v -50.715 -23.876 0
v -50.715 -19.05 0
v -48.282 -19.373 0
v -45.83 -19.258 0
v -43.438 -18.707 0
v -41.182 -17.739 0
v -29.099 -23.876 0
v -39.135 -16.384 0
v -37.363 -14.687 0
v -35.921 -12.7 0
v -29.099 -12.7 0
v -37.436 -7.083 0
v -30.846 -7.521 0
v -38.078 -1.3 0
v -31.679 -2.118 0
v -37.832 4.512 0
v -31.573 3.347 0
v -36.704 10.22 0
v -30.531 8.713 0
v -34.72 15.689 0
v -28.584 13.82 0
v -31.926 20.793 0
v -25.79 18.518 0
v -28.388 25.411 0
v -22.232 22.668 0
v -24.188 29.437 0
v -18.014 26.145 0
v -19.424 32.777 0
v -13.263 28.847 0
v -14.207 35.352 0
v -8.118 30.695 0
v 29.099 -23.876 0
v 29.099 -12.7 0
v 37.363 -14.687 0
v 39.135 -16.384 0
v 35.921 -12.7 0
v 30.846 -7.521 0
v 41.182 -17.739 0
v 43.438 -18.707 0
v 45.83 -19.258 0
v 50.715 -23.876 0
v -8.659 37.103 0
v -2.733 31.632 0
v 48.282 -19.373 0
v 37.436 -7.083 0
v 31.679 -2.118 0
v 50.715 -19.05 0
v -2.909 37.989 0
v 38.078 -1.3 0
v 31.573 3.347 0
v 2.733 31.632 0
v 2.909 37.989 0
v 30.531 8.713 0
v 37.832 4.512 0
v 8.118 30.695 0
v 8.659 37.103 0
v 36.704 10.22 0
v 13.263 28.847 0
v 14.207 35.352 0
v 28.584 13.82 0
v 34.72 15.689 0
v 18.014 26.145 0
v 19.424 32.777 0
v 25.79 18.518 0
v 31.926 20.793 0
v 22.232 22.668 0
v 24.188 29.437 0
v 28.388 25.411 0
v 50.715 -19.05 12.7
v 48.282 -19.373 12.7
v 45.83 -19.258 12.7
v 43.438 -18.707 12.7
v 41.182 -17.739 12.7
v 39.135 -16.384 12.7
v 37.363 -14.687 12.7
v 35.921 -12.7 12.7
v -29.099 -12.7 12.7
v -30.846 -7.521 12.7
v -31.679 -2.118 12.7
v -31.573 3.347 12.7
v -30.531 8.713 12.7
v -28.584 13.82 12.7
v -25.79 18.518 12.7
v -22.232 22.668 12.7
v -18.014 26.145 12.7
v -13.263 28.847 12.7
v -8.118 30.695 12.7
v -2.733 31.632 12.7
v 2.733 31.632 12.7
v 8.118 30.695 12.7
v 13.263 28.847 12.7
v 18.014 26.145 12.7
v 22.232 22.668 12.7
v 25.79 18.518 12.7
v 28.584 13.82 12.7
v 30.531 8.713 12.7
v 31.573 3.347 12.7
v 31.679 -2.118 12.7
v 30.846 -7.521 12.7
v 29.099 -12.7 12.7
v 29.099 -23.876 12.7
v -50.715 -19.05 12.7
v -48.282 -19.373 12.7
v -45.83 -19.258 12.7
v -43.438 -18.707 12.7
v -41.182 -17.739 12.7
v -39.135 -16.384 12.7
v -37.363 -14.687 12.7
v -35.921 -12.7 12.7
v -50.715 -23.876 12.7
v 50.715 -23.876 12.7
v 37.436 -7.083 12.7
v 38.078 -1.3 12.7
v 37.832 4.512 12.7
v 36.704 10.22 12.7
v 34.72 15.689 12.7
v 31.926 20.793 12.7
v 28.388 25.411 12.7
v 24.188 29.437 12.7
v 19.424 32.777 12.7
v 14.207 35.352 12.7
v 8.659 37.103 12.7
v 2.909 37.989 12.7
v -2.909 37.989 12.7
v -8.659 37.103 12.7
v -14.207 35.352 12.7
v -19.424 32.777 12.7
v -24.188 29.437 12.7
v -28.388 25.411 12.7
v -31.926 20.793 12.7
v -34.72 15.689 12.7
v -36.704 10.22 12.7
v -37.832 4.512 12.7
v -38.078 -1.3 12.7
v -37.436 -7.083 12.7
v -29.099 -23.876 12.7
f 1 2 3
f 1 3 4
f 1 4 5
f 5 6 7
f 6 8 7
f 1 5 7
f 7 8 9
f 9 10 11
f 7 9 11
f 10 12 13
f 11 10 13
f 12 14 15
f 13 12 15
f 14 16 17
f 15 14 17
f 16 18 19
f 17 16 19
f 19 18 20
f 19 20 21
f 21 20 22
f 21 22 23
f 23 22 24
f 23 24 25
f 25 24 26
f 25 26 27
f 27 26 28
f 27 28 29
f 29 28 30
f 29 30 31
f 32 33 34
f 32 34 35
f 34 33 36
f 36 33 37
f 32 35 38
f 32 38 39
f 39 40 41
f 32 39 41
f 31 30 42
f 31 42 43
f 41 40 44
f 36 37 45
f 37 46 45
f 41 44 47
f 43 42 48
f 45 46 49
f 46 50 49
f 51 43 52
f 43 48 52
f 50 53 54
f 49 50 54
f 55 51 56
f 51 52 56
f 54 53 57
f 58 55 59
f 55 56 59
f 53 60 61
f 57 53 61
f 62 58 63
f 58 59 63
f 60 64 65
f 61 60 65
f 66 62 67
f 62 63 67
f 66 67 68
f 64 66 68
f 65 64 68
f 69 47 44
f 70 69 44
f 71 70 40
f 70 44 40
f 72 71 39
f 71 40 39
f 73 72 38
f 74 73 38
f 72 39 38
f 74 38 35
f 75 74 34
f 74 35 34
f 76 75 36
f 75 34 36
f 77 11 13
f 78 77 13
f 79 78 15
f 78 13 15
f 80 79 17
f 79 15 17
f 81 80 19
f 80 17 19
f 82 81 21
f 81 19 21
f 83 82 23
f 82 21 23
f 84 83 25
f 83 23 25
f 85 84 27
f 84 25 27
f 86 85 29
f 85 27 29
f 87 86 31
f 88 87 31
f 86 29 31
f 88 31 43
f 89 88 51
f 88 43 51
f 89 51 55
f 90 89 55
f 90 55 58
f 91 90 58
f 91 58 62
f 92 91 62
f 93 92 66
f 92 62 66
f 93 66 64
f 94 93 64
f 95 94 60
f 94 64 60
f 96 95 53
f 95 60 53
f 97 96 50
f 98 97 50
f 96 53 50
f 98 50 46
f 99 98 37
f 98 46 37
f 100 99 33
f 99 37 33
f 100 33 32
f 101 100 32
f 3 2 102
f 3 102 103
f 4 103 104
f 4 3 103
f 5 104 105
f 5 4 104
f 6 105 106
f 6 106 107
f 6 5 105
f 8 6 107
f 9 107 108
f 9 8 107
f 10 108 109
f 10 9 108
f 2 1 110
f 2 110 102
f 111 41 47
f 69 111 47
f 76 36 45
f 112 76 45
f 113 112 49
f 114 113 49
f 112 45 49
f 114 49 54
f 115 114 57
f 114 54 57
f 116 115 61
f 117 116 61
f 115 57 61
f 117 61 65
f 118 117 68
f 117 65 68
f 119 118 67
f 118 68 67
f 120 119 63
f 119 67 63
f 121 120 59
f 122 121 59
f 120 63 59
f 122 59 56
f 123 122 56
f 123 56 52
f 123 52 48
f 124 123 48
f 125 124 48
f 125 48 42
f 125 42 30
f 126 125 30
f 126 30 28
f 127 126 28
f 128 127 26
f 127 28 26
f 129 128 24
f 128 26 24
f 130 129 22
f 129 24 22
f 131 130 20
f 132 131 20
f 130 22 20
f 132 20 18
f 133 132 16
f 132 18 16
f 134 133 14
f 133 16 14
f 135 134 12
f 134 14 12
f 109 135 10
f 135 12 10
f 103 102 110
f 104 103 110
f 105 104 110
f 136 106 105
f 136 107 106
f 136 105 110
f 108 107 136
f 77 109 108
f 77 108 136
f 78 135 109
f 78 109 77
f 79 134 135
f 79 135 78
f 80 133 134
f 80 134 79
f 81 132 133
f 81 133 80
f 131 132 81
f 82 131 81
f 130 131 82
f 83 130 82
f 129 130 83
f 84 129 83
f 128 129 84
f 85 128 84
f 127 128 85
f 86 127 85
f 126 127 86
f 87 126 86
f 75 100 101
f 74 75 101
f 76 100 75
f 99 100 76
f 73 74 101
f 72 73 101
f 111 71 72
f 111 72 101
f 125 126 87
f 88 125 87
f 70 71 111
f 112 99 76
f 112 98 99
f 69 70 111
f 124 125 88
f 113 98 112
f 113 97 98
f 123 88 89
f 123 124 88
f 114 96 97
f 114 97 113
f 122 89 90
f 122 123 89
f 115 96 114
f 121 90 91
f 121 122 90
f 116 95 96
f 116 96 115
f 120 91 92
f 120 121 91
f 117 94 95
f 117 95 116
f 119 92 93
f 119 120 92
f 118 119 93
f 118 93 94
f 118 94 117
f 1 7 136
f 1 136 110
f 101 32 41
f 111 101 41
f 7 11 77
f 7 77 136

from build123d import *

# Parameters (mm, degrees)
BOSS_EXTRUDE2_DEPTH = 12.7
BOSS_EXTRUDE3_DEPTH = 12.7


with BuildPart() as part:
    # Sketch3 → Boss-Extrude2 (new body)
    with BuildSketch(Plane.XY):
        with BuildLine():
            Line((-35.921024484, -12.7), (-29.099355663, -12.7))
            ThreePointArc((-29.099355663, -12.7), (0, 31.75), (29.099355663, -12.7))
            Line((29.099355663, -12.7), (35.921024484, -12.7))
            ThreePointArc((35.921024484, -12.7), (0, 38.1), (-35.921024484, -12.7))
        make_face()
    extrude(amount=BOSS_EXTRUDE2_DEPTH)

    # Sketch4 → Boss-Extrude3 (add)
    with BuildSketch(Plane(origin=(0, 0, 0), x_dir=(-1, 0, 0), z_dir=(0, 0, -1))):
        with BuildLine():
            Line((-29.099355663, -12.7), (-29.099355663, -23.876))
            Line((-29.099355663, -23.876), (-50.714755663, -23.876))
            Line((-50.714755663, -23.876), (-50.714755663, -19.05))
            ThreePointArc((-50.714755663, -19.05), (-42.288257842, -18.27375629), (-35.921024484, -12.7))
            Line((-35.921024484, -12.7), (-29.099355663, -12.7))
        make_face()
        with BuildLine():
            Line((29.099355663, -12.7), (29.099355663, -23.876))
            Line((29.099355663, -23.876), (50.714755663, -23.876))
            Line((50.714755663, -23.876), (50.714755663, -19.05))
            ThreePointArc((50.714755663, -19.05), (42.288257842, -18.27375629), (35.921024484, -12.7))
            Line((35.921024484, -12.7), (29.099355663, -12.7))
        make_face()
    extrude(amount=-BOSS_EXTRUDE3_DEPTH)


solid = part.part
